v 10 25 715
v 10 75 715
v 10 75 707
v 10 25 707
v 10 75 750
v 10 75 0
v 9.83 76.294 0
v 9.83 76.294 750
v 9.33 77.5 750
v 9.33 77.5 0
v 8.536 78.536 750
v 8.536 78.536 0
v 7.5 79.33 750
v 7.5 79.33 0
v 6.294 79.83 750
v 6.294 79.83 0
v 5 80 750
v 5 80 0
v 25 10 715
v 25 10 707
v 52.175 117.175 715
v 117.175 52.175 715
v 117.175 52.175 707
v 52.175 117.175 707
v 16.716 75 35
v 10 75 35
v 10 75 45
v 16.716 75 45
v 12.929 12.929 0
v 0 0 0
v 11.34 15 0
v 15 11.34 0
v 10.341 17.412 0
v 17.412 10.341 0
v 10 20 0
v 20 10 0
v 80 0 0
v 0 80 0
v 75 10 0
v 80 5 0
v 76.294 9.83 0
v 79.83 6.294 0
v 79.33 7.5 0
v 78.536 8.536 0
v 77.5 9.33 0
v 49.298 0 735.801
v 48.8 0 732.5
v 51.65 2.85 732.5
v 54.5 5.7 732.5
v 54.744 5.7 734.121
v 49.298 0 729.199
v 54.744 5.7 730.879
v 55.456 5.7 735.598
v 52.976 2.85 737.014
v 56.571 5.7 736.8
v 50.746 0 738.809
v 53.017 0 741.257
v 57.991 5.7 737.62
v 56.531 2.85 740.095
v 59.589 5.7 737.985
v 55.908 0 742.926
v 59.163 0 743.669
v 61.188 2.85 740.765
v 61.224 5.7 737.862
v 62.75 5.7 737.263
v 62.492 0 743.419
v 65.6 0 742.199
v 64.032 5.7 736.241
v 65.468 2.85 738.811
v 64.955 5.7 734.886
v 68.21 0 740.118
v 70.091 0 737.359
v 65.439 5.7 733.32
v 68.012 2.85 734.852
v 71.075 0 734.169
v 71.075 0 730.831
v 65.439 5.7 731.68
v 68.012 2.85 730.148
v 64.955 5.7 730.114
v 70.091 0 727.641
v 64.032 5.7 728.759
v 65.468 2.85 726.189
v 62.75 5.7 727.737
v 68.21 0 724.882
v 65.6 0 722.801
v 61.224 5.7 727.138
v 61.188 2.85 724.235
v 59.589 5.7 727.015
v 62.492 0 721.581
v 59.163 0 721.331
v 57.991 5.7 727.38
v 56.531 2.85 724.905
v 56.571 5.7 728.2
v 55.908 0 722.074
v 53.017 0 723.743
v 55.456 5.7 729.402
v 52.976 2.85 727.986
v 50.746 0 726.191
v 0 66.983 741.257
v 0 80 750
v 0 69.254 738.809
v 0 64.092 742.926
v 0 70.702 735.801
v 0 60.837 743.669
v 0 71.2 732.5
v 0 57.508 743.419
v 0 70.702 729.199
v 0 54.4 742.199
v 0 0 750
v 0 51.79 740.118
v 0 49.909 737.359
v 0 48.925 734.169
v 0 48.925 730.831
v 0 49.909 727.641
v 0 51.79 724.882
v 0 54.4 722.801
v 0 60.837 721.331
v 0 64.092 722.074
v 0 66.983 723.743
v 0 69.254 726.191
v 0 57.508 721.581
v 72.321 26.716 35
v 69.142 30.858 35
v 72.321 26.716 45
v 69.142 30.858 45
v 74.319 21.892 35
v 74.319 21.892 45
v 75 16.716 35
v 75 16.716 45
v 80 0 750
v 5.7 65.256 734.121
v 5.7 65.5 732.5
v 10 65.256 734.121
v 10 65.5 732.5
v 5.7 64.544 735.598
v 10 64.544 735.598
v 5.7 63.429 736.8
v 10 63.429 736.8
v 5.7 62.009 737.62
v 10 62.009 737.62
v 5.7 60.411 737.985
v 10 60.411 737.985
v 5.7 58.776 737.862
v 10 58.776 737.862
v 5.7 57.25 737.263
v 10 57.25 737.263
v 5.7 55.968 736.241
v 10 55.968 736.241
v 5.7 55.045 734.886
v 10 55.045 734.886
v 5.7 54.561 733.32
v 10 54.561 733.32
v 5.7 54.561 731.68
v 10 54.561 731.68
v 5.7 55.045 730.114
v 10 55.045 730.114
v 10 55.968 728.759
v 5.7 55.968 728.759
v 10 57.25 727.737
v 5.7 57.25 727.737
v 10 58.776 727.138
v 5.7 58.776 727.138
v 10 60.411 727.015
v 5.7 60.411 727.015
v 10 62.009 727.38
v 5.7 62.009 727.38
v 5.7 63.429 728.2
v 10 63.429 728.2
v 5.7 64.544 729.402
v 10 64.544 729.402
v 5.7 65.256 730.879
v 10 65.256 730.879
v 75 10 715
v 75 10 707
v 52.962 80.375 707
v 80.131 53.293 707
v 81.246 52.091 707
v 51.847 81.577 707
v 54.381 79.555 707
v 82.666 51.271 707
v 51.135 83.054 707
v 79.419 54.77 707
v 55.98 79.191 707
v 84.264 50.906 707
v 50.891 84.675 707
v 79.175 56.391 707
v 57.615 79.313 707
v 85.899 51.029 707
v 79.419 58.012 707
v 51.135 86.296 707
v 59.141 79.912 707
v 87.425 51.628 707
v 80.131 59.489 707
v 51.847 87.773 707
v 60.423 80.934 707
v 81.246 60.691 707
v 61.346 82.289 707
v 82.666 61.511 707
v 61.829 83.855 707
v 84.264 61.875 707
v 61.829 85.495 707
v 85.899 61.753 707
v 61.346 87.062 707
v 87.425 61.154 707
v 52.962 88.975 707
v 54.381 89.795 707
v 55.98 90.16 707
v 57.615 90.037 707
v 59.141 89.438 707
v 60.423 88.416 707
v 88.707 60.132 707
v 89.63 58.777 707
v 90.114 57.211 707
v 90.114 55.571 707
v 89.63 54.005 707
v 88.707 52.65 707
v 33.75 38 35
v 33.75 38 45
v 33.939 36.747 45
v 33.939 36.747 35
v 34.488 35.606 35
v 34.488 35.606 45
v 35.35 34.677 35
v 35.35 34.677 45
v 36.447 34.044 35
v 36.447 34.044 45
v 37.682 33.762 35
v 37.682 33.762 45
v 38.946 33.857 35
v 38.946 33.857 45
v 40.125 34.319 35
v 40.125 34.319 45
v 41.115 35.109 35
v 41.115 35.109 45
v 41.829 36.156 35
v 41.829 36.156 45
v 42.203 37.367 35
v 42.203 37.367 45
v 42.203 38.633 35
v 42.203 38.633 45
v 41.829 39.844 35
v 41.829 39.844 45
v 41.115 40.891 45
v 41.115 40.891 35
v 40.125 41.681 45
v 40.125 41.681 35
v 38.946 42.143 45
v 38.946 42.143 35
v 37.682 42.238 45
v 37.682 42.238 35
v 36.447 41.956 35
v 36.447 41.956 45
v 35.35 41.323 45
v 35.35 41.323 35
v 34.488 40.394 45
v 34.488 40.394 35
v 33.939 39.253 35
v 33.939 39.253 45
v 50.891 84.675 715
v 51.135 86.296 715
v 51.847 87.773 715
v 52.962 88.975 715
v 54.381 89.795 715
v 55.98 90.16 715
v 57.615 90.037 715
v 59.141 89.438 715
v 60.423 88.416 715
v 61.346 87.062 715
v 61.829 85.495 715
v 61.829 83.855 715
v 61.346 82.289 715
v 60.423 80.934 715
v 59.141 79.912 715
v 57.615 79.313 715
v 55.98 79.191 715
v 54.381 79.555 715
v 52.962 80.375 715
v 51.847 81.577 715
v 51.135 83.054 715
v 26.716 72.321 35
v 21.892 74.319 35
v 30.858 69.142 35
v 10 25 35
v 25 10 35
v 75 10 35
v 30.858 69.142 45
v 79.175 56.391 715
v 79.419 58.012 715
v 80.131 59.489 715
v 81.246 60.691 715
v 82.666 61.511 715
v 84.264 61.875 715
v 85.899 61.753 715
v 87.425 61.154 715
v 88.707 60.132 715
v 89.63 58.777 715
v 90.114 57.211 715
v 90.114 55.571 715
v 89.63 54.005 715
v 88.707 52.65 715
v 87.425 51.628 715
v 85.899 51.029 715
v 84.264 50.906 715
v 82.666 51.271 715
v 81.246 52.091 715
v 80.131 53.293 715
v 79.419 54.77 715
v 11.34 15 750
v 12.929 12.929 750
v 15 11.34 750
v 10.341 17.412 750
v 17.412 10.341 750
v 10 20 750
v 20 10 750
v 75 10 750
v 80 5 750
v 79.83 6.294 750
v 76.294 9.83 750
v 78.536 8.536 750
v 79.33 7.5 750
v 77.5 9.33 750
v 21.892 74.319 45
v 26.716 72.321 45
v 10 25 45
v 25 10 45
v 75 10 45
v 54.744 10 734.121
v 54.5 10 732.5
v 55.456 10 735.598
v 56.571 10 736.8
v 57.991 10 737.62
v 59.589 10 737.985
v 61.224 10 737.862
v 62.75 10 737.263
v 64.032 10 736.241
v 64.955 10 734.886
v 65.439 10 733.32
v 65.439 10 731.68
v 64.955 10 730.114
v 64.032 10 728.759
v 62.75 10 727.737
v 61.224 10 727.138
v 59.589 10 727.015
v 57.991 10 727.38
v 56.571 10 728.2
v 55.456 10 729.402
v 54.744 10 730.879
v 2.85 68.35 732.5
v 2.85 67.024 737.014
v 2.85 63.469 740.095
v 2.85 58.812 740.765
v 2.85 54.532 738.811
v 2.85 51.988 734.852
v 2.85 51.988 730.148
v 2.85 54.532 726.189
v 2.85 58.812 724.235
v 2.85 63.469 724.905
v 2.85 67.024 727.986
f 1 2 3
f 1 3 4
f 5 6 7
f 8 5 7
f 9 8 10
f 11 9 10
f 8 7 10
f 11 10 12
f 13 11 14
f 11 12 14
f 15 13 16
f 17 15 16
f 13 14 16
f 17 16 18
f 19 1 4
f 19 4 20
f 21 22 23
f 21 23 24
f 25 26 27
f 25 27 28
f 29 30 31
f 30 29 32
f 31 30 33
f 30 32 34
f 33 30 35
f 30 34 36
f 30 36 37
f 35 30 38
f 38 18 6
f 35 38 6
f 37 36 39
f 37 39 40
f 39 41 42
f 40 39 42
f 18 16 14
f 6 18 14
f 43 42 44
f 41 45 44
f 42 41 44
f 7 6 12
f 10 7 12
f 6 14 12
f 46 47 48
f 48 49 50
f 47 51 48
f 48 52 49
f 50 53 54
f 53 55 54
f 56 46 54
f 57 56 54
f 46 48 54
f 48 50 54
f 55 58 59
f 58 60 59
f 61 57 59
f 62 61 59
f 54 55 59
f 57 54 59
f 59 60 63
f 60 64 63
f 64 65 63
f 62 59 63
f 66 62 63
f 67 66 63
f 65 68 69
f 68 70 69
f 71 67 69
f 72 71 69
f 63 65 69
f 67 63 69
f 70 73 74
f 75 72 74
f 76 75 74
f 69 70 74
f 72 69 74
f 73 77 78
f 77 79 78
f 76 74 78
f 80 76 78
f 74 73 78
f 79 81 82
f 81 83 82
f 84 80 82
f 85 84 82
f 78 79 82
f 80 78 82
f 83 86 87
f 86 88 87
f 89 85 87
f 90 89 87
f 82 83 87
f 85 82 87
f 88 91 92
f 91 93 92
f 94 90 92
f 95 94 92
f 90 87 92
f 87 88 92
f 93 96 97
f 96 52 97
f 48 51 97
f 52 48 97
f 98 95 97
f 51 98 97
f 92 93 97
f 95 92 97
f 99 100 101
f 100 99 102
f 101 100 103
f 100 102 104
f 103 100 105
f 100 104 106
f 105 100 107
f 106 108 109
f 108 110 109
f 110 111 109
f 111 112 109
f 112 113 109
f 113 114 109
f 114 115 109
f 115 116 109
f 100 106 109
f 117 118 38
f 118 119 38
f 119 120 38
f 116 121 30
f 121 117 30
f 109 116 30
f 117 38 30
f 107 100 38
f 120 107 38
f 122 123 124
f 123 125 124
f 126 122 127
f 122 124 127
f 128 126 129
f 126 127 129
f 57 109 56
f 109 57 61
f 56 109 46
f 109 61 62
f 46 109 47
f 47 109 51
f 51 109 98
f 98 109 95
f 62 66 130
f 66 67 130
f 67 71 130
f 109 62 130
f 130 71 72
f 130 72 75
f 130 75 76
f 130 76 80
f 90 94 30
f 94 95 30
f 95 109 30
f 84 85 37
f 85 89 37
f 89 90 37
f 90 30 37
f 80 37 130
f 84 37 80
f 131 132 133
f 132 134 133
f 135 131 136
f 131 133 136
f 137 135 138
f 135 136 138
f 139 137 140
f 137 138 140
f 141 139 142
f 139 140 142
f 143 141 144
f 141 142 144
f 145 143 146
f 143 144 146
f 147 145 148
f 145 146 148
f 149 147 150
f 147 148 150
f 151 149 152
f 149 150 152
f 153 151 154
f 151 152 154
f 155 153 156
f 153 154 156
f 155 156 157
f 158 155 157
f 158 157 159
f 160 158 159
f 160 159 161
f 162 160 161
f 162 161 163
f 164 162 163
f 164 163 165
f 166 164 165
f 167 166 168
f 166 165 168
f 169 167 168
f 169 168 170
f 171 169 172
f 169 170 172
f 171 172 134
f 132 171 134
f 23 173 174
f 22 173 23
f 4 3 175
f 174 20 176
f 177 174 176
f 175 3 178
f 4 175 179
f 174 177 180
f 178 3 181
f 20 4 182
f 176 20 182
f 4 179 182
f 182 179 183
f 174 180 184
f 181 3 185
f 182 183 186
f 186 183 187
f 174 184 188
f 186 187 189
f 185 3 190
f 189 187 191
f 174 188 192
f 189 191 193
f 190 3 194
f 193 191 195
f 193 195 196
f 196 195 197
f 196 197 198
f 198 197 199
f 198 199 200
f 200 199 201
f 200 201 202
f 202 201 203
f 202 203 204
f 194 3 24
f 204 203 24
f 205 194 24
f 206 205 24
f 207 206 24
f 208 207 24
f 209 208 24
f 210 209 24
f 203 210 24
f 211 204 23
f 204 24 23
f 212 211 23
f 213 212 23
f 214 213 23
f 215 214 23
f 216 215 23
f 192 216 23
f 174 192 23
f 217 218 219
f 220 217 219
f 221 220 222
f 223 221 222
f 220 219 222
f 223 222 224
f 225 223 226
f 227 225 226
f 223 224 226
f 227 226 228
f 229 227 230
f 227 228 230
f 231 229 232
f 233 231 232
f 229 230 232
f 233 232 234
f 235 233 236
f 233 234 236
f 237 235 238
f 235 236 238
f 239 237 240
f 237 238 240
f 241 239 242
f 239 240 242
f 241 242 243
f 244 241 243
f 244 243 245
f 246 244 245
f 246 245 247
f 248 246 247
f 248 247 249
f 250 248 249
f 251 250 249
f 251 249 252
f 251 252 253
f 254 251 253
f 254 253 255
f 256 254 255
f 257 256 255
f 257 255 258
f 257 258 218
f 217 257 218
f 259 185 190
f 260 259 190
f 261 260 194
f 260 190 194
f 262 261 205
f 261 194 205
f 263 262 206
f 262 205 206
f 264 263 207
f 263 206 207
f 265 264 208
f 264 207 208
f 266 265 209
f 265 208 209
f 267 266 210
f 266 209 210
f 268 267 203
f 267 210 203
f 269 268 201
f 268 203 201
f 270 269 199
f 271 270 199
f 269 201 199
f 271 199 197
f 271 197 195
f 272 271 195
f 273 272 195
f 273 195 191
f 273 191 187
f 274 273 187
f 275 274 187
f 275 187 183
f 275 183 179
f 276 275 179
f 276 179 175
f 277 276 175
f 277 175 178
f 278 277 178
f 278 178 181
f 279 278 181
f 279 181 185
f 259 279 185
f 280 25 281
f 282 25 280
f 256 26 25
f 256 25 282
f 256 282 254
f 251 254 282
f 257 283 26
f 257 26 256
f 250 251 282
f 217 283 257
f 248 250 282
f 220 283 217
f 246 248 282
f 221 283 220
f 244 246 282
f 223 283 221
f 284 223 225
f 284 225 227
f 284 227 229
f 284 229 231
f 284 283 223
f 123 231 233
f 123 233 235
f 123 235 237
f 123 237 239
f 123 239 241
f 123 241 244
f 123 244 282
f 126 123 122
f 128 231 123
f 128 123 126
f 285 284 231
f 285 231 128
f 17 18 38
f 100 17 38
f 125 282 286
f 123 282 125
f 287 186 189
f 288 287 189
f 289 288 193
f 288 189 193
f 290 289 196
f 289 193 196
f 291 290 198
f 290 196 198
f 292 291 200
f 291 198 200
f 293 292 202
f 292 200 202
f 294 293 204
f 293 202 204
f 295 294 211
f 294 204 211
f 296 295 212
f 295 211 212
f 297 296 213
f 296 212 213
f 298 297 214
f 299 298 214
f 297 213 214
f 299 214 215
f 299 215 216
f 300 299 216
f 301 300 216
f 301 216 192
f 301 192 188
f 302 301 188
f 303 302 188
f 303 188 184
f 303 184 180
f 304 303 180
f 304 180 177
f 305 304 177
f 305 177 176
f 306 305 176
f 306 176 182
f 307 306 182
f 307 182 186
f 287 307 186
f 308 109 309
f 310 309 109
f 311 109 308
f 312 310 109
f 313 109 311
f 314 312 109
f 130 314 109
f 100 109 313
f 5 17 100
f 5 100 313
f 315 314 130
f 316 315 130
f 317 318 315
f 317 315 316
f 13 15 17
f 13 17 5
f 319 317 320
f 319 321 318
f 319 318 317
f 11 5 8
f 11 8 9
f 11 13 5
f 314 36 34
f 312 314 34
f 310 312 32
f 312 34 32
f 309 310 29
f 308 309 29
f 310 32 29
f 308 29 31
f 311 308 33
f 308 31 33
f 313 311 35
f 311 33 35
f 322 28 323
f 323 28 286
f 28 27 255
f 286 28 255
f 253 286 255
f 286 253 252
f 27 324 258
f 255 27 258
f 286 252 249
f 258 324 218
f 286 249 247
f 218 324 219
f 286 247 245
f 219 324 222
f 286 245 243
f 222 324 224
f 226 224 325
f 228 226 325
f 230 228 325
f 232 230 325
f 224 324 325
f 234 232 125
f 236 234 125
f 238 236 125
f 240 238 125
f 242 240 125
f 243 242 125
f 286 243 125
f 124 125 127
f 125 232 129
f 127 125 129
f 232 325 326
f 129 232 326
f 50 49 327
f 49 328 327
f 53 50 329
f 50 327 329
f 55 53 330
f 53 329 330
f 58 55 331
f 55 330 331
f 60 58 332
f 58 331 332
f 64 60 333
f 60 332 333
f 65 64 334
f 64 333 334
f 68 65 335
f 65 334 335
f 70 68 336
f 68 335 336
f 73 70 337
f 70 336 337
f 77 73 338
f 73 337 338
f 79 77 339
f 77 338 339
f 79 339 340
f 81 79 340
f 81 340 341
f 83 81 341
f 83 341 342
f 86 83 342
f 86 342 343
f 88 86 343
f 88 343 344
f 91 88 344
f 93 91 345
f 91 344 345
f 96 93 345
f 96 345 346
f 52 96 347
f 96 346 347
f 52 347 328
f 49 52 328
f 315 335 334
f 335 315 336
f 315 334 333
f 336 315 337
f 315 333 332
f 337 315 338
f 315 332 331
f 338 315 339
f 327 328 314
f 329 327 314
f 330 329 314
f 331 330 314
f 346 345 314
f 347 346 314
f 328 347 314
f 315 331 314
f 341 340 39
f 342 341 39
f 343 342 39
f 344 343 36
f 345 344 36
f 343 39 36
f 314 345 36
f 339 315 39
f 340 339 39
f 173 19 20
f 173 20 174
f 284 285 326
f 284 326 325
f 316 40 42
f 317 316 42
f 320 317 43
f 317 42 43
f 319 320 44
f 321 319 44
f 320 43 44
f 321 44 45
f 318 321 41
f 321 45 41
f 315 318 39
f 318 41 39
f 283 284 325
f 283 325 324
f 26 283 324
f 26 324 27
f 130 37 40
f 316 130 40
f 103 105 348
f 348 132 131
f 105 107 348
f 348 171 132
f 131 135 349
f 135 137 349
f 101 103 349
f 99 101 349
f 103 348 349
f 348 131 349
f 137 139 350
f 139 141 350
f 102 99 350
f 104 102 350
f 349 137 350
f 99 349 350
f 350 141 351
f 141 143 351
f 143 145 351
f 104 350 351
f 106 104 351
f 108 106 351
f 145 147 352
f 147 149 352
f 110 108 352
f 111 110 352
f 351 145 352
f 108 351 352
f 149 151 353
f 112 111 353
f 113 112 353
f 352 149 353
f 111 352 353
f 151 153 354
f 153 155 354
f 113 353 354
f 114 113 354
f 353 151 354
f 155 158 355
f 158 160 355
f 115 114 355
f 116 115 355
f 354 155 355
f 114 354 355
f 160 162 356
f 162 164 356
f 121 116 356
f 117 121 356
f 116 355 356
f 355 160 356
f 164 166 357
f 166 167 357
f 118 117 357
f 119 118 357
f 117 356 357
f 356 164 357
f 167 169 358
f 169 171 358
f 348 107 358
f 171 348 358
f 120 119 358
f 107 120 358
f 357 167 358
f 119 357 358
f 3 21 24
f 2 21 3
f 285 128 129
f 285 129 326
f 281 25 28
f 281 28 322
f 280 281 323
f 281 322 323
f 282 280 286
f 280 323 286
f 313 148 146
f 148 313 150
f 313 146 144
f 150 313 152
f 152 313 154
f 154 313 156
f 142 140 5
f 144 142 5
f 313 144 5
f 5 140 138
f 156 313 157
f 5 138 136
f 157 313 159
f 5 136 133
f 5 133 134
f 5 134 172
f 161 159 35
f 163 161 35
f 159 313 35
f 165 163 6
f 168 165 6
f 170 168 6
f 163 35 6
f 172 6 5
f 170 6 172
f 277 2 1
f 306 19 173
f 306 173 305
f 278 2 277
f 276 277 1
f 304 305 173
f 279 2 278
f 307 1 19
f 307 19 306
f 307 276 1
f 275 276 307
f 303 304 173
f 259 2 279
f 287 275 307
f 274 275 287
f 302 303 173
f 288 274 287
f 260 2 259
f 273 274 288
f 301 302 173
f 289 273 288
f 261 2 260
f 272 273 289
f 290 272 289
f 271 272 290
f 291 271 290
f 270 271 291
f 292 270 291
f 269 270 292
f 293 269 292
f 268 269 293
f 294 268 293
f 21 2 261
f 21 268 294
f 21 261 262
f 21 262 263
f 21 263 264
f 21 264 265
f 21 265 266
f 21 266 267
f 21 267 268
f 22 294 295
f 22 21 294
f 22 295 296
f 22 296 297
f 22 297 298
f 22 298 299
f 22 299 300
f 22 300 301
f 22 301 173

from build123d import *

# Parameters (mm, degrees)
F4_DEPTH       = 750
F6_D           = 11
F6_CSINK_D     = 22.4
F6_CSINK_ANGLE = 90
F8_D           = 11
F8_CSINK_D     = 22.4
F8_CSINK_ANGLE = 90
F12_DEPTH      = 8
F14_DEPTH      = 10
F15_R          = 20
F16_D          = 8.5
F17_D          = 11


with BuildPart() as f4:
    # F3 (on Top) → F4 (new body)
    with BuildSketch(Plane.XY):
        with BuildLine():
            Line((5, 80), (0, 80))
            Line((0, 80), (0, 0))
            Line((0, 0), (80, 0))
            Line((80, 0), (80, 5))
            ThreePointArc((80, 5), (78.5355339059, 8.5355339059), (75, 10))
            Line((75, 10), (20, 10))
            ThreePointArc((20, 10), (12.9289321881, 12.9289321881), (10, 20))
            Line((10, 20), (10, 75))
            ThreePointArc((10, 75), (8.5355339059, 78.5355339059), (5, 80))
        make_face()
    extrude(amount=F4_DEPTH)

    # F6 (through all)
    with Locations(Plane.XZ):
        with Locations((60, 732.5)):
            CounterSinkHole(F6_D / 2, F6_CSINK_D / 2, counter_sink_angle=F6_CSINK_ANGLE)

    # F8 (through all)
    with Locations(Plane(origin=(0, 0, 0), x_dir=(0, -1, 0), z_dir=(-1, 0, 0))):
        with Locations((-60, 732.5)):
            CounterSinkHole(F8_D / 2, F8_CSINK_D / 2, counter_sink_angle=F8_CSINK_ANGLE)


with BuildPart() as f12:
    # F11 (on offset) → F12 (new body)
    with BuildSketch(Plane.XY.offset(715)):
        Polygon((52.1751442127, 117.1751442127), (10, 75), (10, 25), (25, 10), (75, 10), (117.1751442127, 52.1751442127), align=None)
    extrude(amount=-F12_DEPTH)

    # F17 (through all)
    with Locations(Plane.XY.offset(715)):
        with Locations((56.3908729653, 84.6751442127), (84.6751442127, 56.3908729653)):
            Hole(F17_D / 2)


with BuildPart() as f14:
    # F13 (on offset) → F14 (new body)
    with BuildSketch(Plane(origin=(0, 0, 35), x_dir=(1, 0, 0), z_dir=(0, 0, -1))):
        Polygon((10, -25), (10, -75), (25, -75), (50, -50), (17.5, -17.5), align=None)
        Polygon((25, -10), (17.5, -17.5), (50, -50), (75, -25), (75, -10), align=None)
    extrude(amount=-F14_DEPTH)

    # F15
    f15_edges = [f14.edges().sort_by_distance(p)[0] for p in [
        (25, 75, 40),
        (75, 25, 40),
    ]]
    fillet(f15_edges, radius=F15_R)

    # F16 (through all)
    with Locations(Plane(origin=(0, 0, 35), x_dir=(1, 0, 0), z_dir=(0, 0, -1))):
        with Locations((38, -38)):
            Hole(F16_D / 2)


solid = Compound([f4.part, f12.part, f14.part])
